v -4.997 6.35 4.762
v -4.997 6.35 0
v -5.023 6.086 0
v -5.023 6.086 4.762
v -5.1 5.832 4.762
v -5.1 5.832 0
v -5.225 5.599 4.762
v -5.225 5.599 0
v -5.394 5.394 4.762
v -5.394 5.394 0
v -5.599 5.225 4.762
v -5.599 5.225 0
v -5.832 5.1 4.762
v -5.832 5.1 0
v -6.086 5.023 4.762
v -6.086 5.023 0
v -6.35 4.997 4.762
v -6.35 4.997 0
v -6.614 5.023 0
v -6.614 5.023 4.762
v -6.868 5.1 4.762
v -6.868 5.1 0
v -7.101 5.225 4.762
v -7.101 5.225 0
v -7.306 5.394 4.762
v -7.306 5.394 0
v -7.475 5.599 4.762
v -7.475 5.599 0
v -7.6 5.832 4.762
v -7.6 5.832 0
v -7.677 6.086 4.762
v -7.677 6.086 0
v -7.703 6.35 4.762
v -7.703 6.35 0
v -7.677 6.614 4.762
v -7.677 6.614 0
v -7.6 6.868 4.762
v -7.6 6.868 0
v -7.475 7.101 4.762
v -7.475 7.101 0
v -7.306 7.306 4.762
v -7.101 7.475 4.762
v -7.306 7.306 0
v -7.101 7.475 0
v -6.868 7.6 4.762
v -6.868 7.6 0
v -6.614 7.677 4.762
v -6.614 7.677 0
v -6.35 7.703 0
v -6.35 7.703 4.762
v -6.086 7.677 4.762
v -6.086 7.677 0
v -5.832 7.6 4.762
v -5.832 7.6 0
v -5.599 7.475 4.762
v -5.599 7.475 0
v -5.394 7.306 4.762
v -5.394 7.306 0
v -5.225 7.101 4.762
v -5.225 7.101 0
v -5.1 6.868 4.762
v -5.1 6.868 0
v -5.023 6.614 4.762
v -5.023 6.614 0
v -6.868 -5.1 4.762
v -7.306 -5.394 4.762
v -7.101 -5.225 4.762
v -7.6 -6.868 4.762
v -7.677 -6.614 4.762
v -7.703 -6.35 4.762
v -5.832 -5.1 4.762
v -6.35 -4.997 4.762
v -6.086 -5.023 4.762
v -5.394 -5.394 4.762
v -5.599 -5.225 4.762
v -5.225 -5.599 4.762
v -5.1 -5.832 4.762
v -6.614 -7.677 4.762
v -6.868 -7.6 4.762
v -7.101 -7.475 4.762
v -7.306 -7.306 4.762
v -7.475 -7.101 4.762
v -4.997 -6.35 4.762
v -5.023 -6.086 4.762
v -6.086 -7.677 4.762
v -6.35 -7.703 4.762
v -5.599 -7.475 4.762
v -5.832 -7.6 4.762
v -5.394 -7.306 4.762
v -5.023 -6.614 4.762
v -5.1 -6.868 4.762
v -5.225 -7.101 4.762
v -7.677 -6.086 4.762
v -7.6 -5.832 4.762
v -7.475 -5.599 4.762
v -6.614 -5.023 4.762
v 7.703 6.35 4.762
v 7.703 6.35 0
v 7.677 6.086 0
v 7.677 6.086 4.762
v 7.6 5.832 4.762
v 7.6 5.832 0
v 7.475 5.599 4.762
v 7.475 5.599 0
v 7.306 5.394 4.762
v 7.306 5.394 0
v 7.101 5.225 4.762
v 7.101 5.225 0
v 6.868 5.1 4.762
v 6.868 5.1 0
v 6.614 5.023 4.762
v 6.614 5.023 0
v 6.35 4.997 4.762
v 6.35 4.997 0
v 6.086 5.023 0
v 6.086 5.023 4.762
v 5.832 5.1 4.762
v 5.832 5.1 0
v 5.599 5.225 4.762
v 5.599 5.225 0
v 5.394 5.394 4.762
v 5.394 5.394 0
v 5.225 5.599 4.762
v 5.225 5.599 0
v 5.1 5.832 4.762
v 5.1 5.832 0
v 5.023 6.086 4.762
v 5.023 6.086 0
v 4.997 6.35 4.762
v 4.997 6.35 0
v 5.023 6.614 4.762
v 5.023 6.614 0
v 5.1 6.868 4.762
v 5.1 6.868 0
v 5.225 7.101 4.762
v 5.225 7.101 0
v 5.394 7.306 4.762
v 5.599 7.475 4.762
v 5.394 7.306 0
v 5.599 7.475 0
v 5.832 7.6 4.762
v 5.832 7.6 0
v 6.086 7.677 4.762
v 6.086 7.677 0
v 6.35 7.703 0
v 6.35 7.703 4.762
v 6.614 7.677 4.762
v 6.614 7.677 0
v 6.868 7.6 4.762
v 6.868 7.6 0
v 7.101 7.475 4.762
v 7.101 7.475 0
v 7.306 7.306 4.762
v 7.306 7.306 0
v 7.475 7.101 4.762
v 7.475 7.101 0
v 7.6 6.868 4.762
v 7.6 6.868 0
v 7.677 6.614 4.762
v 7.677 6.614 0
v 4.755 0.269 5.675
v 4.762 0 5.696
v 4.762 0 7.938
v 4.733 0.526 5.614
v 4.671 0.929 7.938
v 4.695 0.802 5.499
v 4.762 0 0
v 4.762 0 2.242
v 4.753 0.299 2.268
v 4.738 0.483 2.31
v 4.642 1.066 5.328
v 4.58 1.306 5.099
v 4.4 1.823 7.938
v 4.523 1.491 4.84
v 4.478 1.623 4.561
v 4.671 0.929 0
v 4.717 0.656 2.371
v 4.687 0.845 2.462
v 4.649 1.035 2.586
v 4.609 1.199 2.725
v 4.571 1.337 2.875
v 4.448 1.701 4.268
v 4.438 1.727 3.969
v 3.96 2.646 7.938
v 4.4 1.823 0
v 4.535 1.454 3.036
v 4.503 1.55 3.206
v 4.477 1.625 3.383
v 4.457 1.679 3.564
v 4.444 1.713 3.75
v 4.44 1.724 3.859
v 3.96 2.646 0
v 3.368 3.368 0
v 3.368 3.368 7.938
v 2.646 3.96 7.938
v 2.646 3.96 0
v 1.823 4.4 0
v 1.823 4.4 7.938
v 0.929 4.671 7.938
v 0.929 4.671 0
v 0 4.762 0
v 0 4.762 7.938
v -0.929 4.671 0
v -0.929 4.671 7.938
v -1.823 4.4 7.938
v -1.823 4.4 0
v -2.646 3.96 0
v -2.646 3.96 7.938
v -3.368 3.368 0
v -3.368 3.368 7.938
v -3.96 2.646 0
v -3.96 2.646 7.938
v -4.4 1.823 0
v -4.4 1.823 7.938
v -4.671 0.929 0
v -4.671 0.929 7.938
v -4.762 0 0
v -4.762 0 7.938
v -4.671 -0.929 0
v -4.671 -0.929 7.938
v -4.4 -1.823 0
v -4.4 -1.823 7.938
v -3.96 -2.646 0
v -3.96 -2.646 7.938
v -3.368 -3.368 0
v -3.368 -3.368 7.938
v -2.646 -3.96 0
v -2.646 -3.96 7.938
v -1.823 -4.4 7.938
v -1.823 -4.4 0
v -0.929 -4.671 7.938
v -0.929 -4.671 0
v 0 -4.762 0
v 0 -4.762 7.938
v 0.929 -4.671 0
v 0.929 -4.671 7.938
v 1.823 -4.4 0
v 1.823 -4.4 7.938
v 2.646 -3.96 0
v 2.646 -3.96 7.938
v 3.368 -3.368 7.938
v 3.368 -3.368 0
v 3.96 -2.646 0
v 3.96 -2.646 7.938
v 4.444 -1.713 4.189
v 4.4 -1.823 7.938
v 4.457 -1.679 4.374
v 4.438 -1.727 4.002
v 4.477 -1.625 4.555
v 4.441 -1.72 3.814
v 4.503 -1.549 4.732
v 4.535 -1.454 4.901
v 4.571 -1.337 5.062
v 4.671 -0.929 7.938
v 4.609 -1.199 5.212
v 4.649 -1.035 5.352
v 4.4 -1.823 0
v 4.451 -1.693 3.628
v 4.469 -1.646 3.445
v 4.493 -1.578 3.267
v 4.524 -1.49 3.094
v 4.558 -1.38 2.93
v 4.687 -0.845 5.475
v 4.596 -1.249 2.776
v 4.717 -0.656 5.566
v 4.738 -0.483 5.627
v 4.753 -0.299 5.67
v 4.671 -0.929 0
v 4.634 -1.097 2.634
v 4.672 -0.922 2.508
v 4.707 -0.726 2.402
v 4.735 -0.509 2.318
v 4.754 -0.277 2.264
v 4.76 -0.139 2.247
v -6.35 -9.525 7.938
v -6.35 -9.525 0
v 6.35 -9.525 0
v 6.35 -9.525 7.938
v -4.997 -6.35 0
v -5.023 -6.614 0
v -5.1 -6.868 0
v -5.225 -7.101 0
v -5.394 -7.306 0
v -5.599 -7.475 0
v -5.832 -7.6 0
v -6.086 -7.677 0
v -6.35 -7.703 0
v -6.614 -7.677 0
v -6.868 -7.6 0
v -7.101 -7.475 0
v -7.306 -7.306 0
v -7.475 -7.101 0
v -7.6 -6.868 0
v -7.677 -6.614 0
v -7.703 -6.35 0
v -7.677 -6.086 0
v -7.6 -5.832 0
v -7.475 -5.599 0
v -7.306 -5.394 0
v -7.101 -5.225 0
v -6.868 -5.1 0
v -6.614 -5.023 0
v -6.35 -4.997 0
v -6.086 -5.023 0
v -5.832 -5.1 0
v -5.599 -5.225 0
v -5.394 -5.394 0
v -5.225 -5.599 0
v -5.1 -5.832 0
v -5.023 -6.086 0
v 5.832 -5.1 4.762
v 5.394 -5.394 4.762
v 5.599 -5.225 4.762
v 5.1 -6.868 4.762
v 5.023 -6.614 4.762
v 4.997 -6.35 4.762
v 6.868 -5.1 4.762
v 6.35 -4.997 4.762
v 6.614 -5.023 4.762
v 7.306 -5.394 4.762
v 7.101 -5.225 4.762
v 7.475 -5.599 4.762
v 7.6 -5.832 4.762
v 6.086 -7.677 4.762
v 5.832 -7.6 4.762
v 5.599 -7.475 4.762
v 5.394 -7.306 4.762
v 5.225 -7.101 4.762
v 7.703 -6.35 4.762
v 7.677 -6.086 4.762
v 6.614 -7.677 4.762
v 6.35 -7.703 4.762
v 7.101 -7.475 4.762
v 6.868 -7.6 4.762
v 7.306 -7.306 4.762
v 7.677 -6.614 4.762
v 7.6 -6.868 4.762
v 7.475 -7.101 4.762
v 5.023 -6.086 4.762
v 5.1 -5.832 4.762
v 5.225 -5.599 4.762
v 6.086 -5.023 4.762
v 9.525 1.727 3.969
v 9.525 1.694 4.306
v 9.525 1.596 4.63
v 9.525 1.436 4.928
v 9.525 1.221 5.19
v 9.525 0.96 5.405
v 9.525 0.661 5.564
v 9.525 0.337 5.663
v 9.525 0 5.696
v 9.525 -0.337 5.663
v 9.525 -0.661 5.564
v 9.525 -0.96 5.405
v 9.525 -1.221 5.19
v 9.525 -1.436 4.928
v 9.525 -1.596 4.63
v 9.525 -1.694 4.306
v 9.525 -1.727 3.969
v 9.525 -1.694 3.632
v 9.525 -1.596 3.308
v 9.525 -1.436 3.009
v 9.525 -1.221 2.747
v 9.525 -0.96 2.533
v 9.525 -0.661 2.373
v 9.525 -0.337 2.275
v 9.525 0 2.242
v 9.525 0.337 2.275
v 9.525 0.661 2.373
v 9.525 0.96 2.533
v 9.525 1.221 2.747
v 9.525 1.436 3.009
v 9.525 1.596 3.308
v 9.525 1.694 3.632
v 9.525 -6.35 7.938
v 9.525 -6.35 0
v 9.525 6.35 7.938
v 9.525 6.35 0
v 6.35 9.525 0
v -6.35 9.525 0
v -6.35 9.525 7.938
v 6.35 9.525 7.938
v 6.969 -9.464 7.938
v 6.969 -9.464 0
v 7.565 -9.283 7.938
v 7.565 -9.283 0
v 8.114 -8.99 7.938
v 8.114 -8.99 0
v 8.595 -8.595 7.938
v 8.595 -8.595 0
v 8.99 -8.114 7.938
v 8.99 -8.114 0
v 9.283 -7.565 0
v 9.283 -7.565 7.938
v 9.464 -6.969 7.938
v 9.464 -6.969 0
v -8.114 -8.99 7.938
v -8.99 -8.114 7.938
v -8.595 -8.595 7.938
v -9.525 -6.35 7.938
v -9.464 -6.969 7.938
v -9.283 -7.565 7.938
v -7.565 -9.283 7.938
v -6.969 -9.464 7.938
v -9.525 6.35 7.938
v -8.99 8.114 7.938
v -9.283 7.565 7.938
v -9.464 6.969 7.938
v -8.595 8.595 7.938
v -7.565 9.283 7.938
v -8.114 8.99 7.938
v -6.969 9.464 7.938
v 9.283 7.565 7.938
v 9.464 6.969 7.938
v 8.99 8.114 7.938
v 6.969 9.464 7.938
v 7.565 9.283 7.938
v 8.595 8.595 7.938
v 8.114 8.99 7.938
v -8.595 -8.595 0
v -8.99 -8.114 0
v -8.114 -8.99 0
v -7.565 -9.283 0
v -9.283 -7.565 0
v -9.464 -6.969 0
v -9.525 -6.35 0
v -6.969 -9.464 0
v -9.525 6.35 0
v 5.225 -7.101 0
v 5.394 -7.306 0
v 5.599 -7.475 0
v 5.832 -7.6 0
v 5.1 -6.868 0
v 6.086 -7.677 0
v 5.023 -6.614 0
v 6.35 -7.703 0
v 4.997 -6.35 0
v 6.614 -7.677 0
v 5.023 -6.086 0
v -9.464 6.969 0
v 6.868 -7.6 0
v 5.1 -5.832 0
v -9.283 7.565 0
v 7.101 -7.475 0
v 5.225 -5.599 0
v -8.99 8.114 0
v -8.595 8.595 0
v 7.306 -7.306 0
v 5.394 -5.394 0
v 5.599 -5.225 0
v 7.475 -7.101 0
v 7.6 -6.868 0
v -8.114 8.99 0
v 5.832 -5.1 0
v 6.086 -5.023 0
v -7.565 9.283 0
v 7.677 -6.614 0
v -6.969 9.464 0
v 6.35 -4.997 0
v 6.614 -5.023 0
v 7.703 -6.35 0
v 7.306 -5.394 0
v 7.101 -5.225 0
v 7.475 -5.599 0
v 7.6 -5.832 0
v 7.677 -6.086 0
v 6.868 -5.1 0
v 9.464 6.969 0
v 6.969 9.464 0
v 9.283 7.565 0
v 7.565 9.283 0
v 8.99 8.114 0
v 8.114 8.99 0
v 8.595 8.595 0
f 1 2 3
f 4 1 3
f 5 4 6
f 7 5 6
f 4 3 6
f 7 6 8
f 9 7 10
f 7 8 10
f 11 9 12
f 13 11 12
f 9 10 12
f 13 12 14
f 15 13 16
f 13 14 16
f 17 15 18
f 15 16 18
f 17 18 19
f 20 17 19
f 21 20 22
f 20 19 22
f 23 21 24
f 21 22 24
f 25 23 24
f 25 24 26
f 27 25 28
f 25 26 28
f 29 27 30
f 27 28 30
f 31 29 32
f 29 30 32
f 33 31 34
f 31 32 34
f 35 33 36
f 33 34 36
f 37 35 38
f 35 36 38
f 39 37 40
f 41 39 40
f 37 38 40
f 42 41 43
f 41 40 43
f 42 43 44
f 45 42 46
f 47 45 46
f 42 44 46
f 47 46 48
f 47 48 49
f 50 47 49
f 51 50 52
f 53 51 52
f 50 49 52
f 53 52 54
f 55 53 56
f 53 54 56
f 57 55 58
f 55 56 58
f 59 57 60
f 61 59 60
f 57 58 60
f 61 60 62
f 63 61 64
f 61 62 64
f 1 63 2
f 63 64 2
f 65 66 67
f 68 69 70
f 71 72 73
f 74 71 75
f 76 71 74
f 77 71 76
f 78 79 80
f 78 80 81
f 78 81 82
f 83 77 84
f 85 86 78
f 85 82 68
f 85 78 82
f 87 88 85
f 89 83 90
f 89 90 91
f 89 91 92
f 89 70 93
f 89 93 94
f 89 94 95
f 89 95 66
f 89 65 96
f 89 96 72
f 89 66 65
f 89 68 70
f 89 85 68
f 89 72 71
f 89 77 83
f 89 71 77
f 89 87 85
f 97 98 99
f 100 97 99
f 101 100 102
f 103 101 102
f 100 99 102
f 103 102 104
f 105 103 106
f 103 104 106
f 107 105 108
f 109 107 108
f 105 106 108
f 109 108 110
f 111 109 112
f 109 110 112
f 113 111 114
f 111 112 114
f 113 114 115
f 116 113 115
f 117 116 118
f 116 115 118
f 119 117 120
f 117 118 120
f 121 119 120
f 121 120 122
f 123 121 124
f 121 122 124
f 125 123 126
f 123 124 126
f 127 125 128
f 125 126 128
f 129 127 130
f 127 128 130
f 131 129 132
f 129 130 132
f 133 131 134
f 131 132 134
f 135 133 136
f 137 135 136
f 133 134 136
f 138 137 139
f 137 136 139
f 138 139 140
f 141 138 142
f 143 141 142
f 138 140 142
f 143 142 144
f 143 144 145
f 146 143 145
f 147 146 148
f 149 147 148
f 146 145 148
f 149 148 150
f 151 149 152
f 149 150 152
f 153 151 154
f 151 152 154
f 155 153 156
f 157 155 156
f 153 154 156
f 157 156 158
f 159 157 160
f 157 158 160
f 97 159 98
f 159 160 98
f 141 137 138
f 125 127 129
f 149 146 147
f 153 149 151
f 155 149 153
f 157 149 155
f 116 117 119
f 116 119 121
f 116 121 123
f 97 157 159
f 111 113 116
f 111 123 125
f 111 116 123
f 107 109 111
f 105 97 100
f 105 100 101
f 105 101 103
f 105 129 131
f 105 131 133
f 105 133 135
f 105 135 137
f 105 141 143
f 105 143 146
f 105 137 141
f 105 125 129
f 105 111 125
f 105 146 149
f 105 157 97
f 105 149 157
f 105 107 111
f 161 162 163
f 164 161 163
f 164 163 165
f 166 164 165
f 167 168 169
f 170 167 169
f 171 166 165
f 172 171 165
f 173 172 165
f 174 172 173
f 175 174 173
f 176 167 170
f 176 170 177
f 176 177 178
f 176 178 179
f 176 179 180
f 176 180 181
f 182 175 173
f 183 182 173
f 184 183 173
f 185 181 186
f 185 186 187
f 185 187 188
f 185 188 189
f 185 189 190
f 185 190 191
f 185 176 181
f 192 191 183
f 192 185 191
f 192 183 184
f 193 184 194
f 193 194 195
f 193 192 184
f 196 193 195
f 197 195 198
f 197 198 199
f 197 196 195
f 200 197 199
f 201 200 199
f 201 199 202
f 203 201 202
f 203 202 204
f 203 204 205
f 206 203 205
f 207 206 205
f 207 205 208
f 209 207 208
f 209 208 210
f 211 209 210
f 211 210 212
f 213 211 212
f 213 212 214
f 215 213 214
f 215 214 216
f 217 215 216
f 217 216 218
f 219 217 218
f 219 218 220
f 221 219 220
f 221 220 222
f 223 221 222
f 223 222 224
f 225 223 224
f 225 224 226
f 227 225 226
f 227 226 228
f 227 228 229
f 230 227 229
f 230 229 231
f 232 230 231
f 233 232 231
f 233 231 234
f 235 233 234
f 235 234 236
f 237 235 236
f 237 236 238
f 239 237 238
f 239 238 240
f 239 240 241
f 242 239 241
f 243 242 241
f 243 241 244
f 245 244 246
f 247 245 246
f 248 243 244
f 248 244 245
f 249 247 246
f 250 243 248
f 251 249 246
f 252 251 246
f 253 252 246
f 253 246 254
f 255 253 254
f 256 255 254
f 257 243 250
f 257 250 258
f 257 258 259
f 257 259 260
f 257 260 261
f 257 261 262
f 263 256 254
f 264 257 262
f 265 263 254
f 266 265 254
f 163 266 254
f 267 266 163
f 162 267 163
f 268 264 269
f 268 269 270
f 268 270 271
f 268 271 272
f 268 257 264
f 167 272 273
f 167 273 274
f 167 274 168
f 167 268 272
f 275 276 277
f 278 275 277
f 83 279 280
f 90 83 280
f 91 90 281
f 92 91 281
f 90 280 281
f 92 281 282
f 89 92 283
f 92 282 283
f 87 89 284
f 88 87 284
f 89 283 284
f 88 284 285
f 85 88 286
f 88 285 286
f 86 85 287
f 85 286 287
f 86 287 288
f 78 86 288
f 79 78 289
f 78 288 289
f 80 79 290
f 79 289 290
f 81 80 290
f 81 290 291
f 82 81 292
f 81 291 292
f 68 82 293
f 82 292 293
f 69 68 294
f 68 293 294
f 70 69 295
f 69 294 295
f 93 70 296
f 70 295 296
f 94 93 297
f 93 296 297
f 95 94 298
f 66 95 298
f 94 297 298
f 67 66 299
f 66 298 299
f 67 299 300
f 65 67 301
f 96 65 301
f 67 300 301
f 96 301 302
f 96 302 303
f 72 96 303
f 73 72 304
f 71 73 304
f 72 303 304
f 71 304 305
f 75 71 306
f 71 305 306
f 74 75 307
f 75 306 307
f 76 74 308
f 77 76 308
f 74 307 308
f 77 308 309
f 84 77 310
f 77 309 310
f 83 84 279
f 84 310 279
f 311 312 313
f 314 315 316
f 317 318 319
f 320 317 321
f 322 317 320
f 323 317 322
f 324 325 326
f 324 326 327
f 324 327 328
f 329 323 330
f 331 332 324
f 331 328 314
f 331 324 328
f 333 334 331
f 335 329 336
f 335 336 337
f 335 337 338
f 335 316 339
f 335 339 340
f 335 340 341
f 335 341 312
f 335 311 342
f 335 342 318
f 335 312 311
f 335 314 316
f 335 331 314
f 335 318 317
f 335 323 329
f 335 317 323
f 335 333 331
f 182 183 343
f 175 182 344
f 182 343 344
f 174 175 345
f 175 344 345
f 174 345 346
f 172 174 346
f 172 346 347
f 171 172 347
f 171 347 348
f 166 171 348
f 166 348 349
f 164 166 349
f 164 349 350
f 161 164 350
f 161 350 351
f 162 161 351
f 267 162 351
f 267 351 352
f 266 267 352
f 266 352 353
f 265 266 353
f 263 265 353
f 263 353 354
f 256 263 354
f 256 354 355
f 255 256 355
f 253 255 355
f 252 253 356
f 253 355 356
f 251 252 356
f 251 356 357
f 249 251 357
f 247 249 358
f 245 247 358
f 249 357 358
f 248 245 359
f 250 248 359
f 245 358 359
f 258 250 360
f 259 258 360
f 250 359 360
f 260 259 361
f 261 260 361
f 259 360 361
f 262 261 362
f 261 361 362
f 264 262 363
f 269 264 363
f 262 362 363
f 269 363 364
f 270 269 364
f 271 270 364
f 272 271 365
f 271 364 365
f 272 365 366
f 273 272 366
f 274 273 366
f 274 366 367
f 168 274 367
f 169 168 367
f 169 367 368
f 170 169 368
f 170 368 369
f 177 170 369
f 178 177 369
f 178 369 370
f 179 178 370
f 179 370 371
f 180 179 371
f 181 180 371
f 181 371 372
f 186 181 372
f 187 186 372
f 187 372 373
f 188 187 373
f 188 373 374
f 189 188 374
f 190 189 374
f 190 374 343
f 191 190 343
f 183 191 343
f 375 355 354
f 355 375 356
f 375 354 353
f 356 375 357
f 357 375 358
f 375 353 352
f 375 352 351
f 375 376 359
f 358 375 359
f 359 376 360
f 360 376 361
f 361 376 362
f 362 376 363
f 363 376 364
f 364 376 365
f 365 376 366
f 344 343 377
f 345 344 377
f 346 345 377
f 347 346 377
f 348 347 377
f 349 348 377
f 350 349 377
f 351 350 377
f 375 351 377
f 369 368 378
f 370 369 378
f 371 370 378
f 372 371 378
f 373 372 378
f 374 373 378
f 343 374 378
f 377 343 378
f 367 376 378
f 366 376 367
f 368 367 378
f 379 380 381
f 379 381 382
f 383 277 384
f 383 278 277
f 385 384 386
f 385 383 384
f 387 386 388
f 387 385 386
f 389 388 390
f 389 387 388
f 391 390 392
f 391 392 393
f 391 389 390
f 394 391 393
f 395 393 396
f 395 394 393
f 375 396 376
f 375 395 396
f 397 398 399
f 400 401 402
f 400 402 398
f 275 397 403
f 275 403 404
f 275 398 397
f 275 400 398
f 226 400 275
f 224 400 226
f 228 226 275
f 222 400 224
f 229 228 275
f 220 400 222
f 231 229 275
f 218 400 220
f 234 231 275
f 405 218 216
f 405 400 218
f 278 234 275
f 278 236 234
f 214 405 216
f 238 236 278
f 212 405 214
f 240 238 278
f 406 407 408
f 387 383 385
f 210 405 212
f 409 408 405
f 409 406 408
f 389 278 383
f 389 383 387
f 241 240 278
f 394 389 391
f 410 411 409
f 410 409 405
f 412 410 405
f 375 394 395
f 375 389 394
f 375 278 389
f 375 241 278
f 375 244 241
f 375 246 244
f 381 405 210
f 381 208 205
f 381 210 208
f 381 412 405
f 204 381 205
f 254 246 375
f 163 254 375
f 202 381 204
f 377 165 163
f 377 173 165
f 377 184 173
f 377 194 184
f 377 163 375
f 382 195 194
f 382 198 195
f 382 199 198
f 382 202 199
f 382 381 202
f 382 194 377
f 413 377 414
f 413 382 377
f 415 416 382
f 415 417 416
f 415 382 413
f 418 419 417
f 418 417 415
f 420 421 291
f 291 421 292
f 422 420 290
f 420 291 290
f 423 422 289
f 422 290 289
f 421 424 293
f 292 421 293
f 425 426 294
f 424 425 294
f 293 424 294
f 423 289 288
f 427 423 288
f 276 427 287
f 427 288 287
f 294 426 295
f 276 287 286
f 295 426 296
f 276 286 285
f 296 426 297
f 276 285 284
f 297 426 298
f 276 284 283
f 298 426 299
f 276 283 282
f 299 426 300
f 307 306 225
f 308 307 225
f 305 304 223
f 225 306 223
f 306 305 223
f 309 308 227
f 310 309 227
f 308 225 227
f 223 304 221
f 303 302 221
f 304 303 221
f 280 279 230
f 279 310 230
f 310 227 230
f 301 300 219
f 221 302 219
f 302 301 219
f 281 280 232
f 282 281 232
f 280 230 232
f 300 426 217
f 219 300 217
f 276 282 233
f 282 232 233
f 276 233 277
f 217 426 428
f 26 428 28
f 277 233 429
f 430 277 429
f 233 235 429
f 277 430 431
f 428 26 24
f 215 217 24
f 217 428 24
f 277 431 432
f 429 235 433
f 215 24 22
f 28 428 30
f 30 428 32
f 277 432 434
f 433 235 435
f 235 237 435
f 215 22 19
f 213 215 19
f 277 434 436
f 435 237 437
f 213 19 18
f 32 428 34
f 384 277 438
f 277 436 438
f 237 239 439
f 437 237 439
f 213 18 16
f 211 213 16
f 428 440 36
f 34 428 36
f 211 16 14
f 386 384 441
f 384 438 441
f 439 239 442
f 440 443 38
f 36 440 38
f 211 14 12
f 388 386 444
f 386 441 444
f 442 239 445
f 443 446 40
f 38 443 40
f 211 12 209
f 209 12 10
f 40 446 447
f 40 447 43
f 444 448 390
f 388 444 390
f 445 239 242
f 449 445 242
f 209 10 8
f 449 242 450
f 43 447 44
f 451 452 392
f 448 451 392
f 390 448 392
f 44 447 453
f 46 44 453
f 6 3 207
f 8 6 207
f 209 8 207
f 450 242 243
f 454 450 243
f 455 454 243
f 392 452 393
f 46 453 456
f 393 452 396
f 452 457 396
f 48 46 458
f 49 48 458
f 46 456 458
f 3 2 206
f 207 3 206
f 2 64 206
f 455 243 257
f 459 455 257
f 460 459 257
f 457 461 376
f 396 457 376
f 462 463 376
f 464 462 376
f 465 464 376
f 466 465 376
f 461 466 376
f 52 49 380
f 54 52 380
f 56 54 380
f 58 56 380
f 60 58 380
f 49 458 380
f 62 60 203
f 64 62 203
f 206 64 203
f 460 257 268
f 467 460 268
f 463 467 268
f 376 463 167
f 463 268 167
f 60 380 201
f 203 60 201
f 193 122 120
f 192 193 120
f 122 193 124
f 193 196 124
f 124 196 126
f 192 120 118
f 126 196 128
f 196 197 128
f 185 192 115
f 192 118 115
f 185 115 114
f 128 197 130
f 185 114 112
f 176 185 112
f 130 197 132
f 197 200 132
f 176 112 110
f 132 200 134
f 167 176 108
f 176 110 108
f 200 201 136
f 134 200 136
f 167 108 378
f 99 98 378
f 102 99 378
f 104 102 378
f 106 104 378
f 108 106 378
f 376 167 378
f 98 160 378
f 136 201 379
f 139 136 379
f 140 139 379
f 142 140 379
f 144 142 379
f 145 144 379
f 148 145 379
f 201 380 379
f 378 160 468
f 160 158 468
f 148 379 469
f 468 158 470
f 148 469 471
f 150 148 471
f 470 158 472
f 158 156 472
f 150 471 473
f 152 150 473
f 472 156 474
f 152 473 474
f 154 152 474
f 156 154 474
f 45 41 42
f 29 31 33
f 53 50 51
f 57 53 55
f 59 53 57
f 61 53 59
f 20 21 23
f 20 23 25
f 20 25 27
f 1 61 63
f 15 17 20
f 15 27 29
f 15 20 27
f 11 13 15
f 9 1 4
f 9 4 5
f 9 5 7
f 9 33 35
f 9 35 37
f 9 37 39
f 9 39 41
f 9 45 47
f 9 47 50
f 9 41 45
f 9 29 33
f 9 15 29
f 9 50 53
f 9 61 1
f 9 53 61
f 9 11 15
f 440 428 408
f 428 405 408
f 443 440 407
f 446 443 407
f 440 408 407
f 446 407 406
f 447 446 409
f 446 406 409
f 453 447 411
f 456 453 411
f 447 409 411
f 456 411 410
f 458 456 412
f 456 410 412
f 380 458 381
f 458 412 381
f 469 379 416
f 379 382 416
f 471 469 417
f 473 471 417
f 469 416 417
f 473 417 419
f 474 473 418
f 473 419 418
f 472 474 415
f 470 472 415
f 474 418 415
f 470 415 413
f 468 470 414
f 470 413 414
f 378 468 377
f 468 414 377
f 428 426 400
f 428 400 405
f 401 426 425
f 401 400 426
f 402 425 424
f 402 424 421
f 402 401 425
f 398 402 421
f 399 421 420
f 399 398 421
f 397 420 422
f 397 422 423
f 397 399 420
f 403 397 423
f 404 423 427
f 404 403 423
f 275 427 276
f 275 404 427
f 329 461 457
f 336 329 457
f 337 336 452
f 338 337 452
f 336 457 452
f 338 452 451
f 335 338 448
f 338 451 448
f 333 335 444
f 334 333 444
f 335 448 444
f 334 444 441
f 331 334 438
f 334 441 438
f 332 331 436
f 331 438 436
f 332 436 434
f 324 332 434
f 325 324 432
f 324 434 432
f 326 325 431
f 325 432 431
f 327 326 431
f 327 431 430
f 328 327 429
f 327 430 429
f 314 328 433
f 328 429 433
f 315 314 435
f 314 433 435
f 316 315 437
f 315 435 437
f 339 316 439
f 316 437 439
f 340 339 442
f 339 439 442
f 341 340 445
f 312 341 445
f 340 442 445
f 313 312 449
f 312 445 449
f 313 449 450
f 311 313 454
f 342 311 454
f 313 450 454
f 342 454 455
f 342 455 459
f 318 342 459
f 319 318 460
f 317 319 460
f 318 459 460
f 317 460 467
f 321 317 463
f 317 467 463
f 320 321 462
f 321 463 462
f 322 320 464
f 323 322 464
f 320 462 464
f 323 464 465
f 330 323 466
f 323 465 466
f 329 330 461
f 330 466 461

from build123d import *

# Parameters (mm, degrees)
F0_W     = 19.05
F0_H     = 19.05
F0_R     = 4.7625
F1_DEPTH = 7.9375
F2_R     = 3.175
F3_R     = 1.35255
F4_DEPTH = 4.7625
F5_R     = 1.7272
F6_DEPTH = 6.0867362041


with BuildPart() as f1:
    # F0 (on Top) → F1 (new body)
    with BuildSketch(Plane.XY):
        Rectangle(F0_W, F0_H)
        Circle(F0_R, mode=Mode.SUBTRACT)
    extrude(amount=F1_DEPTH)

    # F2
    f2_edges = [f1.edges().sort_by_distance(p)[0] for p in [
        (-9.525, 9.525, 3.96875),
        (-9.525, -9.525, 3.96875),
        (9.525, -9.525, 3.96875),
        (9.525, 9.525, 3.96875),
    ]]
    fillet(f2_edges, radius=F2_R)

    # F3 (on face) → F4 (cut)
    with BuildSketch(Plane(origin=(0, 0, 0), x_dir=(1, 0, 0), z_dir=(0, 0, -1))):
        with Locations((6.35, 6.35)):
            Circle(F3_R)
        with Locations((-6.35, 6.35)):
            Circle(F3_R)
        with Locations((-6.35, -6.35)):
            Circle(F3_R)
        with Locations((6.35, -6.35)):
            Circle(F3_R)
    extrude(amount=-F4_DEPTH, mode=Mode.SUBTRACT)

    # F5 (on face) → F6 (cut, up to face)
    with BuildSketch(Plane.YZ.offset(9.525)):
        with Locations((0, 3.96875)):
            Circle(F5_R)
    extrude(amount=-F6_DEPTH, mode=Mode.SUBTRACT)


solid = f1.part
